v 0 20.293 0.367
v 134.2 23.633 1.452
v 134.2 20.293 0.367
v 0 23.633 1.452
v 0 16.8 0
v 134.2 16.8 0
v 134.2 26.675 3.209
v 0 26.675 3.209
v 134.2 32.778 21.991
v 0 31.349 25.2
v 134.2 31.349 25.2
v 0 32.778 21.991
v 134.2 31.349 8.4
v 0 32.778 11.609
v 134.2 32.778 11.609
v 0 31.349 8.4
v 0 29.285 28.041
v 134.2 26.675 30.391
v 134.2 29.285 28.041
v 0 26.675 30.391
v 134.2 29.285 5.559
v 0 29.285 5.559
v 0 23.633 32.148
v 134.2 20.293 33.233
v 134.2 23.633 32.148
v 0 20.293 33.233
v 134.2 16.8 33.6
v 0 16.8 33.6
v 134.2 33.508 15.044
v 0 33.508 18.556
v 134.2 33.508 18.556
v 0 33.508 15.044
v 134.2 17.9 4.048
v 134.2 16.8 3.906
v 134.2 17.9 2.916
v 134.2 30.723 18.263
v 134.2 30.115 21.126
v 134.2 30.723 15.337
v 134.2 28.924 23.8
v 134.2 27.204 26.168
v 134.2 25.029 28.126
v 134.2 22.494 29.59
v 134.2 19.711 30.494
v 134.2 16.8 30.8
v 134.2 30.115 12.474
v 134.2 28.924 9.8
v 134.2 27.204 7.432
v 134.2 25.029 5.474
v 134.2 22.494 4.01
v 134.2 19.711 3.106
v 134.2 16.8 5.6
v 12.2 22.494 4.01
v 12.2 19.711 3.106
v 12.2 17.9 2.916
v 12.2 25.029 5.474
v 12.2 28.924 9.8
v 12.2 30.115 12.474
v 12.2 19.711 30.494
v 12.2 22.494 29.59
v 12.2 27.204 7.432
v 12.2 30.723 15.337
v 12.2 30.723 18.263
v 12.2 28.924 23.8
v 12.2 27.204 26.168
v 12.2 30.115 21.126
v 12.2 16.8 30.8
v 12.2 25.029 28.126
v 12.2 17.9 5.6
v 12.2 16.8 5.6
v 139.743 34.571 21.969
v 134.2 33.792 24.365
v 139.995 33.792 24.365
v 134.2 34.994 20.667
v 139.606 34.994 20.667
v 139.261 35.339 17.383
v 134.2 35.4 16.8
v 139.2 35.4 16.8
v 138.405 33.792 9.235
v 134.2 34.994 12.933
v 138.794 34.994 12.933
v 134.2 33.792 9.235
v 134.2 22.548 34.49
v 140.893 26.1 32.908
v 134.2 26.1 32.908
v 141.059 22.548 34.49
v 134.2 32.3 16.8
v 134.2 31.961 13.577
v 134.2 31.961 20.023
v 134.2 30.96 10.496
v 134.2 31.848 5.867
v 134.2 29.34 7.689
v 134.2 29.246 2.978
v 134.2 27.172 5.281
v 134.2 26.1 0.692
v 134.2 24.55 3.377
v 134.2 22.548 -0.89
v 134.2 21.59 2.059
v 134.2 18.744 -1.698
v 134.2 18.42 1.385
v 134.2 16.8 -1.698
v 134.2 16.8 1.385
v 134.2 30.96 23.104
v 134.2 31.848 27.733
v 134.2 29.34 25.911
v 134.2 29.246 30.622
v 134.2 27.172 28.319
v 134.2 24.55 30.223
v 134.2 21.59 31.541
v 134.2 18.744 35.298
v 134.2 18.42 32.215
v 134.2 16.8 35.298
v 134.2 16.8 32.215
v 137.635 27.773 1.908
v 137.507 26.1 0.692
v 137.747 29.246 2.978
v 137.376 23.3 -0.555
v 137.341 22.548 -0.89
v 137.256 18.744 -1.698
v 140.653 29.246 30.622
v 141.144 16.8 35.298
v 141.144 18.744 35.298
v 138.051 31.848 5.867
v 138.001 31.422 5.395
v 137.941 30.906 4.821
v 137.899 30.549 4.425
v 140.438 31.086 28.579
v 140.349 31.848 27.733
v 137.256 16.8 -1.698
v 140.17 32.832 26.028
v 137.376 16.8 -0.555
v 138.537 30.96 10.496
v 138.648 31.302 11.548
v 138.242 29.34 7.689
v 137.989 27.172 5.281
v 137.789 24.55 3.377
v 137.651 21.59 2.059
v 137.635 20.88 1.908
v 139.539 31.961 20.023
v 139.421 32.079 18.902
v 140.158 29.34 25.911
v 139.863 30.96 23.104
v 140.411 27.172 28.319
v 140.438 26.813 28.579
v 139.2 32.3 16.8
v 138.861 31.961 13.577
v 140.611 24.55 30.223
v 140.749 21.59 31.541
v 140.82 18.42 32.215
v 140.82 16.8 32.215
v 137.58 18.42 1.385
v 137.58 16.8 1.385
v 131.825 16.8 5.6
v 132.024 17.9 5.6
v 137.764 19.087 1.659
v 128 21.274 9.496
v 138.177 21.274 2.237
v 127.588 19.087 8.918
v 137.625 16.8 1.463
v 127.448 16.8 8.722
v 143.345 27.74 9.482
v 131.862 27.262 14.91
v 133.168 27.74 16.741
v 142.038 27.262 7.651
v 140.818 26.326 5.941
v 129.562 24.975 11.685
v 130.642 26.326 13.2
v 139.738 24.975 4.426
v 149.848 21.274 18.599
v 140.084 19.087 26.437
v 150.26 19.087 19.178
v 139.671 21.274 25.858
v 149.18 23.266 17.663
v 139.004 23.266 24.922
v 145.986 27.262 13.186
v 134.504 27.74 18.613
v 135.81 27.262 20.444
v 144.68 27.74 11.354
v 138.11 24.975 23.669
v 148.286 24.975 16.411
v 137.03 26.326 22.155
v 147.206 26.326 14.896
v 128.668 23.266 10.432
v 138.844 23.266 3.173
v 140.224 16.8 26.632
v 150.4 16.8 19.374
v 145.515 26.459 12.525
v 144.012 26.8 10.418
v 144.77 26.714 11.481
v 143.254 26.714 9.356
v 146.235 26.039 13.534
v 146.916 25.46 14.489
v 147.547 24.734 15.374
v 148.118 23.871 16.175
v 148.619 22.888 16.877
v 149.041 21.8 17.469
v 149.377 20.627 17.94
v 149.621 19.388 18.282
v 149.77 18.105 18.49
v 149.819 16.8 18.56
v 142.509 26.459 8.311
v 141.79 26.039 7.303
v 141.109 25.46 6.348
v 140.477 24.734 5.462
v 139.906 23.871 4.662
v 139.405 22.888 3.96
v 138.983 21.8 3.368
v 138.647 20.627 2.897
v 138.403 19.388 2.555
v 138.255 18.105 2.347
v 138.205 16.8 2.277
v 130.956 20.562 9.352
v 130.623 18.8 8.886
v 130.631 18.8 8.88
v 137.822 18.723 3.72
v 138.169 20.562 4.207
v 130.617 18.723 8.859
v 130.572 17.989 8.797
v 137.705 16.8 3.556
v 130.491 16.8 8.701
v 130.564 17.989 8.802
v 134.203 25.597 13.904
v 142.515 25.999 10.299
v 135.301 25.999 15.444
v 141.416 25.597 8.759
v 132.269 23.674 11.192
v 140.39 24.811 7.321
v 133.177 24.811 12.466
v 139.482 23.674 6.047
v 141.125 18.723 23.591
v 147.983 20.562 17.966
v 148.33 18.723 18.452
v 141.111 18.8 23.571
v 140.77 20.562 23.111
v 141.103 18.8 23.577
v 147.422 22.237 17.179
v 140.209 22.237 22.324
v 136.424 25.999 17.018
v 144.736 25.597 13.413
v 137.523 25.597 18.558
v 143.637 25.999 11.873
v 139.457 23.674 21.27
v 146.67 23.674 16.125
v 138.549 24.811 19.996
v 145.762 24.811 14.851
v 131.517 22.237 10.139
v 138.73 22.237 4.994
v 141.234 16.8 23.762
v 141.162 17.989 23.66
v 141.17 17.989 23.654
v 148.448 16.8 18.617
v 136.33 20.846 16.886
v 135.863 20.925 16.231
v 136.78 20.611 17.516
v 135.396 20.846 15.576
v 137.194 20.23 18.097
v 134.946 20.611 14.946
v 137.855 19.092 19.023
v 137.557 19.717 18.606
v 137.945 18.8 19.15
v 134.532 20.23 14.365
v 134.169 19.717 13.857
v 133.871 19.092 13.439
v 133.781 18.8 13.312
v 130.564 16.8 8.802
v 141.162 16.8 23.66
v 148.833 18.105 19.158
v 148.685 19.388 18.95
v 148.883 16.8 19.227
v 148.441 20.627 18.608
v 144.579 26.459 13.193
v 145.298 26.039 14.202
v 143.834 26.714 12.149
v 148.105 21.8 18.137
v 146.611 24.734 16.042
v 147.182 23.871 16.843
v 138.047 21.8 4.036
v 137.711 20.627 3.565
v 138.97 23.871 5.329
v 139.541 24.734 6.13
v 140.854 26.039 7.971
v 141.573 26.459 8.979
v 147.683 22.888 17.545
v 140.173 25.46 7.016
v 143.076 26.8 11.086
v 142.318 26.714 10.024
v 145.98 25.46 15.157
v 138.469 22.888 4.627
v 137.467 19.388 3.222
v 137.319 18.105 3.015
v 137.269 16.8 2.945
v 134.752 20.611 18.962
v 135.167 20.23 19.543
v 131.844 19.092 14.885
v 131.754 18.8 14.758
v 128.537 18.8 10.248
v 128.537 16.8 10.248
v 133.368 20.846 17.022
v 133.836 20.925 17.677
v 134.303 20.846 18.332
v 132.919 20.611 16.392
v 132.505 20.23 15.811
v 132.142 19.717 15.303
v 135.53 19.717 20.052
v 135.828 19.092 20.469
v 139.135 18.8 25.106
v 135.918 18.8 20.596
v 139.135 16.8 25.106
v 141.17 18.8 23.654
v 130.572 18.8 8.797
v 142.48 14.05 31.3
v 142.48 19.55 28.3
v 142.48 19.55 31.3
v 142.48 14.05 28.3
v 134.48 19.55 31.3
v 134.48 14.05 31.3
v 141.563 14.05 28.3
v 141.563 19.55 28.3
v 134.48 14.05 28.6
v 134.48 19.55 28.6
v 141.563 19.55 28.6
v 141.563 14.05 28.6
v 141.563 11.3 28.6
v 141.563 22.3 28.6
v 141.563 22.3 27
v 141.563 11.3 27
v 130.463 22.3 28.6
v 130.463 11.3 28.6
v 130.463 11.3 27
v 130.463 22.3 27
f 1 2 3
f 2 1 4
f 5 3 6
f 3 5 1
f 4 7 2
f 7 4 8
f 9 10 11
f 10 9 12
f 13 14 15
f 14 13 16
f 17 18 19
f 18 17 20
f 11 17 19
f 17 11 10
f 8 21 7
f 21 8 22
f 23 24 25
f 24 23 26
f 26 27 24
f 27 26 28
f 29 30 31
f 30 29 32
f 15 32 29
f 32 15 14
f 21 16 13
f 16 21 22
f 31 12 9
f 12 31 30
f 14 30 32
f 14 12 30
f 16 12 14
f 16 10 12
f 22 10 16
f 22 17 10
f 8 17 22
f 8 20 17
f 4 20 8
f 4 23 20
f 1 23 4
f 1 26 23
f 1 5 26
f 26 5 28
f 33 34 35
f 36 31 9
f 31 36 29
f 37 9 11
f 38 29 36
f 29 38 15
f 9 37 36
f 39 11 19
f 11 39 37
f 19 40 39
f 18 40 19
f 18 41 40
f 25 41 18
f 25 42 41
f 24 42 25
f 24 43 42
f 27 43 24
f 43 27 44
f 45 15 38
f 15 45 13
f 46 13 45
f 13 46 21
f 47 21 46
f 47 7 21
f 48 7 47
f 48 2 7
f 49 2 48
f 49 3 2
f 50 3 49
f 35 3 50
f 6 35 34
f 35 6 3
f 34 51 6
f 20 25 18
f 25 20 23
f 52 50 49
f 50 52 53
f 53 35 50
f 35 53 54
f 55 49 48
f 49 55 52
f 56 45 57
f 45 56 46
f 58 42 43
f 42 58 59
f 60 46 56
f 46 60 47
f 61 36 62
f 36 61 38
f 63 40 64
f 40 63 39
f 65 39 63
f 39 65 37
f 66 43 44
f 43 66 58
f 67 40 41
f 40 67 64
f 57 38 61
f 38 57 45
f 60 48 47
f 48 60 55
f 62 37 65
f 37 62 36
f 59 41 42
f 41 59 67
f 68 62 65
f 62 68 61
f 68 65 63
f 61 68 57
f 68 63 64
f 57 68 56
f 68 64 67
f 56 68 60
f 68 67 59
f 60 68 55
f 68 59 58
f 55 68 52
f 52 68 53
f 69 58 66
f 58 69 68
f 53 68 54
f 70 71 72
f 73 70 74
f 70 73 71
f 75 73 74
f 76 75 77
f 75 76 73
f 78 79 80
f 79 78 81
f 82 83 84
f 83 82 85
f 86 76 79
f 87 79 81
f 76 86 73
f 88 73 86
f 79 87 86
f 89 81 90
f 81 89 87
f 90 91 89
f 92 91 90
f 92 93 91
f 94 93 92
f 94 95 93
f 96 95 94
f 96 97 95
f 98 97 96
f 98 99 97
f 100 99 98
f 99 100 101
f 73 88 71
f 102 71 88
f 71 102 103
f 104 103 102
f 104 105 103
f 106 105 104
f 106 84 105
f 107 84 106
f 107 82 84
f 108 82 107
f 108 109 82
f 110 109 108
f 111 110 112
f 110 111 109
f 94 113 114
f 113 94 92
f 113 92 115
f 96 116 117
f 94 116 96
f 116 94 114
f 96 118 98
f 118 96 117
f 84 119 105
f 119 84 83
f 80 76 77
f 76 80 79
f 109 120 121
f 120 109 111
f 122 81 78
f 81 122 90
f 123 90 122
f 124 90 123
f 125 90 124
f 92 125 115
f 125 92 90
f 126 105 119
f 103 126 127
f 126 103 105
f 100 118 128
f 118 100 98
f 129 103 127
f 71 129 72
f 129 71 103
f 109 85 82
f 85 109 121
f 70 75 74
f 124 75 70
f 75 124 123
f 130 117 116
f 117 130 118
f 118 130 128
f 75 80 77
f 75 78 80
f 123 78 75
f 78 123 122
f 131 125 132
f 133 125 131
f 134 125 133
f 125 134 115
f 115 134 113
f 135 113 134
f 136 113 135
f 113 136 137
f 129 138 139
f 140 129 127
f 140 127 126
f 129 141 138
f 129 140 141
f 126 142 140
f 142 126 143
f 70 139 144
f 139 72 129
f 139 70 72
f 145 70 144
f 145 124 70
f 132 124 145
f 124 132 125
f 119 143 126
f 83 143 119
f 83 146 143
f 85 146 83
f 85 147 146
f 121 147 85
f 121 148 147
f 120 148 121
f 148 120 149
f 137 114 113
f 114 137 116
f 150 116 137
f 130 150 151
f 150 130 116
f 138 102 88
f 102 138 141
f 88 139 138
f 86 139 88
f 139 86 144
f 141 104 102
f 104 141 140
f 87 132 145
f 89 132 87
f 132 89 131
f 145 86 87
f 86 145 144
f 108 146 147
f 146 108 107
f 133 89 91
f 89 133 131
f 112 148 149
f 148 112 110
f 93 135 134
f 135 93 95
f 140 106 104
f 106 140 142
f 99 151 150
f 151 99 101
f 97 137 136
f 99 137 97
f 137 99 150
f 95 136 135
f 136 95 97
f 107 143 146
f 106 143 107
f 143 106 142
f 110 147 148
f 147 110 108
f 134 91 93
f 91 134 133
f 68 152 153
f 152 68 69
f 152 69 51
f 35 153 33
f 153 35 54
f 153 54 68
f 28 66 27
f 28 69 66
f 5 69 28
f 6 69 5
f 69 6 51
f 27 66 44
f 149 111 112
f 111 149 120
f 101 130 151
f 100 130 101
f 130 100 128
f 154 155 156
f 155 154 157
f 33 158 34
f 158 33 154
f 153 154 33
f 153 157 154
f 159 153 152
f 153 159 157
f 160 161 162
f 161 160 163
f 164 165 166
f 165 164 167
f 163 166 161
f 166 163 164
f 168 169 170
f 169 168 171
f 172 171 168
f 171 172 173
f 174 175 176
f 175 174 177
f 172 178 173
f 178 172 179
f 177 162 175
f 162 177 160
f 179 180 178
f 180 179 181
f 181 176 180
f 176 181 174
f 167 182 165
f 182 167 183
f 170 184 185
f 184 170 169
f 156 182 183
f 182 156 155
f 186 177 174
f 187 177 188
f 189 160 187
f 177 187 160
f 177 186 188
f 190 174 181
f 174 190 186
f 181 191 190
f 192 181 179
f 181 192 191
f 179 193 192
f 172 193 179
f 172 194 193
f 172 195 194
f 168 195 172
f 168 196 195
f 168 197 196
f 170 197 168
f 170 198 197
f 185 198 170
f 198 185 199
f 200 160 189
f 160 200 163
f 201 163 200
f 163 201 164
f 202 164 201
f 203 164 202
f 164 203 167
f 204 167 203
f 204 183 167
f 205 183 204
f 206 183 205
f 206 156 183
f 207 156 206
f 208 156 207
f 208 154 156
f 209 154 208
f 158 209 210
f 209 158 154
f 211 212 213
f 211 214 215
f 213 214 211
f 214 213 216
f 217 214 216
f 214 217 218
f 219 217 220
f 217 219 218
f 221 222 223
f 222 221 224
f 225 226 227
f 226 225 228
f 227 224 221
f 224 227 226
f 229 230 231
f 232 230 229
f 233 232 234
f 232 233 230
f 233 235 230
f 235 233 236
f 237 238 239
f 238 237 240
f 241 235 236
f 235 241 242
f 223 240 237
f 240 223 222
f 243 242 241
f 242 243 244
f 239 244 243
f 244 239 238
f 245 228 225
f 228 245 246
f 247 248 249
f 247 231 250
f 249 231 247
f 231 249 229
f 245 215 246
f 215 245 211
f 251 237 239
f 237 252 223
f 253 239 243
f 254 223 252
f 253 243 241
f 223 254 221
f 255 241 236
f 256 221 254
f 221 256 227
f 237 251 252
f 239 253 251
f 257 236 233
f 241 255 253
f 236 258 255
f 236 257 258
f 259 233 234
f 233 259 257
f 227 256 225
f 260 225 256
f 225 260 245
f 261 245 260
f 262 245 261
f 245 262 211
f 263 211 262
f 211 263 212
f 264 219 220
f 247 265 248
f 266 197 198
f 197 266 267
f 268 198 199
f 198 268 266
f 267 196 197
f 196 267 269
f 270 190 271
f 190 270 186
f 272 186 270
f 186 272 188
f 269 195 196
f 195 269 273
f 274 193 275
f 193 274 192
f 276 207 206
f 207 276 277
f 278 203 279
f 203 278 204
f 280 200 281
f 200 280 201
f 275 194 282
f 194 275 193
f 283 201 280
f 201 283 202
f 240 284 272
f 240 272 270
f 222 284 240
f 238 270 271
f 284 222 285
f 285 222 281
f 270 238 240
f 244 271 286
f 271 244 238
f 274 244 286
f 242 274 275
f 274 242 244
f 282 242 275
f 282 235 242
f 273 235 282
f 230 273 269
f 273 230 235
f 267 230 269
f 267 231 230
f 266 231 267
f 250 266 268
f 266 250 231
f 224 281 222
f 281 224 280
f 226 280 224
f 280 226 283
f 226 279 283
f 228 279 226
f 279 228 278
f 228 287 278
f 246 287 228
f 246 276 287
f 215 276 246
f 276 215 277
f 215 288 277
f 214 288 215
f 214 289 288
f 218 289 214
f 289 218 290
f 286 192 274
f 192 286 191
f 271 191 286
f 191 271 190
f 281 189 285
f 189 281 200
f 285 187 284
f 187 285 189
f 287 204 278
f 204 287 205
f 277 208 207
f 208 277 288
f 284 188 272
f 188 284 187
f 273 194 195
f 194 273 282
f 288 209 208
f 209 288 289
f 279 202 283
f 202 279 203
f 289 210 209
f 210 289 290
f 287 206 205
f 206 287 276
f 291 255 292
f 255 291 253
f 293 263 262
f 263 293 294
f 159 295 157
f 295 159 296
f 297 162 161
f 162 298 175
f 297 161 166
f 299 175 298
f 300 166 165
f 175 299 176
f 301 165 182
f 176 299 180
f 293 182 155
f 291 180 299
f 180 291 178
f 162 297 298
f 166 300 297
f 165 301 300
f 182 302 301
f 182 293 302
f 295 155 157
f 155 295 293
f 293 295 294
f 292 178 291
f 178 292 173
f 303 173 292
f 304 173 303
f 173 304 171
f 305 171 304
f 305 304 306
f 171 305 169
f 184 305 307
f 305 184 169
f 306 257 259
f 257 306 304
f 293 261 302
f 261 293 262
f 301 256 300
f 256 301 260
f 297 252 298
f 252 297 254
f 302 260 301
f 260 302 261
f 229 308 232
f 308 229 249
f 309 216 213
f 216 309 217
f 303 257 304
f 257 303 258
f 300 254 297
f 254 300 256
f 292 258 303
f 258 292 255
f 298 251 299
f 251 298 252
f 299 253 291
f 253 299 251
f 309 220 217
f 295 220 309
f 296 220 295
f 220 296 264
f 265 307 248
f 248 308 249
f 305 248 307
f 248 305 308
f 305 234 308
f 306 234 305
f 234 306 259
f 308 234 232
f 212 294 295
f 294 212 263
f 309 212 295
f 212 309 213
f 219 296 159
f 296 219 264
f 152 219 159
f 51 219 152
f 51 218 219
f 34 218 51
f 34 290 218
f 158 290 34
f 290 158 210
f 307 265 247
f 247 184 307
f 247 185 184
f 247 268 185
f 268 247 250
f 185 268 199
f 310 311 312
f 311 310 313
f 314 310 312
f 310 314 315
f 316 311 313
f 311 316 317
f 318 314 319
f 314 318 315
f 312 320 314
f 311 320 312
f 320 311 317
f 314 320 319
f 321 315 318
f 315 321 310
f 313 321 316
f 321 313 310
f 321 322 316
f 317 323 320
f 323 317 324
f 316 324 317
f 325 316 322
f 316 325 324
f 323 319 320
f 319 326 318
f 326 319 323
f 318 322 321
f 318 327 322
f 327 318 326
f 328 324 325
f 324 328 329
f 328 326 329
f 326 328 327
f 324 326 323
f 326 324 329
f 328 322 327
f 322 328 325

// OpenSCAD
// file: 20mm_star_lens_carrier.scad
/*
  For 20mm * 11mm PMMA TIR lenses like: https://www.amazon.com/gp/product/B07VZL6N2Z/

  Replaces/replicates the white plastic plastic housing that comes with the lenses.

  For starboard COB leds like: https://www.amazon.com/gp/product/B07DHB61BH/

  Assumes the main LED body will be ~8mm * 2.5mm (excluding "bubble")
*/
include <common.scad>;
include <20mm_star_lens.scad>;

led_lead_l = 7;

/* Scale the rendered output by this multiple to account for filament shrinkage,
such as if you are using ABS that tends to shrink from 8%-10%. */
shrink_factor = 1.02;

// other

inner_channel_d = lens_ridge_d - 1.5;

// housing_addt = 1;
housing_addt = 0;
// housing_l = lens_total_l+board_t+led_h + housing_addt;
housing_l = lens_cone_l+lens_ridge_l+board_t+led_h + housing_addt;
housing_d = lens_ridge_d + 2;

module housing_cutouts_mock() {
  // pcb cutout
    translate([0, 0, 0]) cylinder(d=board_d, h=board_t);
    // ridge cutout
    translate([0, 0, board_t+led_h+lens_cone_l]) cylinder(d=lens_ridge_d, h=lens_ridge_l);
    // led cutout
    translate([0, 0, board_t]) led();
}

module housing_cutouts_real(ghost_pcb=true) {
  translate([0, 0, 0])
      lens_and_led(include_castelations=false, ghost_pcb=ghost_pcb);
}

module housing(ghost_pcb=true) {
  difference() {
    union() {
      difference() {
        cylinder(d=housing_d, h=housing_l);

        // centre channel
        translate([0, 0, -ff]) cylinder(d=inner_channel_d, h=housing_l+(ff*2));
      }

      translate([0, 0, board_t]) {
        cylinder(d=inner_channel_d, h=led_h-ff);
      }
    }

    translate([0, 0, housing_addt])
      // housing_cutouts_mock();
      housing_cutouts_real(ghost_pcb);
  }
}

module housing_cross_section(ghost_pcb=true) {
  intersection() {
    translate([-housing_d/2, 0, 0]) cube([housing_d, housing_d/2, housing_l+(ff*2)]);
    translate([0, 0, -board_t])
      housing(ghost_pcb);
  }
}

module housing_no_lower() {
  intersection() {
    translate([-housing_d/2, -housing_d/2, 0]) cube([housing_d, housing_d, housing_l+(ff*2)]);
    translate([0, 0, -board_t])
      housing();
  }
}

// lens();
// led();
// star_board();
// translate([0, 0, housing_addt])
//   %lens_and_led();

// scale([shrink_factor, shrink_factor, shrink_factor]) {
//   // housing();
//   // housing_cross_section();
//   housing_no_lower();
// }
// file: 20mm_star_lens.scad
/*
  For 20mm * 11mm PMMA TIR lenses like: https://www.amazon.com/gp/product/B07VZL6N2Z/

  Replaces/replicates the white plastic plastic housing that comes with the lenses.

  For starboard COB leds like: https://www.amazon.com/gp/product/B07DHB61BH/

  Assumes the main LED body will be ~8mm * 2.5mm (excluding "bubble")
*/
include <common.scad>;

// Lens
lens_ridge_d = 20;
lens_ridge_l = 1.15;

lens_front_d = 17.6;
lens_front_l = 1;

lens_cone_l = 11 - (lens_ridge_l + lens_front_l);

lens_aperture_d = 6;

lens_total_l = lens_cone_l + lens_ridge_l + lens_front_l;

// LED Star Board
board_d = 20;
board_t = 1.22;
castelations = 6;
castelation_r = 2.5;

led_d = 8.25;
led_h = 2.5; // just body, not bubble
led_lead_w = 4;
led_lead_l = 3;
led_bubble_d = 5.5;


module lens() {
  cylinder(d=lens_front_d, h=lens_front_l);
  translate([0, 0, lens_front_l]) {
    cylinder(d=lens_ridge_d, h=lens_ridge_l, $fn=48);
      translate([0, 0, lens_ridge_l]) {
        cylinder(d2=lens_aperture_d, d1=lens_front_d, h=lens_cone_l);
      }
  }
}

module star_board(include_castelations=true, ghost_pcb=false) {
  difference() {
    if (ghost_pcb) {
      %cylinder(d=board_d, h=board_t, $fn=48);
    } else {
      cylinder(d=board_d, h=board_t, $fn=48);
    }

    if (include_castelations) {
      for(deg=[0:(360/castelations):360]) {
        rotate([0, 0, deg]) translate([board_d/2, 0, -ff]) cylinder(r=castelation_r, h=board_t+(ff*2));
      }
    }
  }
  translate([0, 0, board_t]) led();
}

module led() {
  cylinder(d=led_d, h=led_h, $fn=32);
  translate([-((led_lead_l*2)+led_d)/2, -led_lead_w/2, 0]) cube([(led_lead_l*2)+led_d, led_lead_w, led_h]);
  translate([0, 0, led_h]) sphere(d=led_bubble_d, $fn=16);
}

module lens_and_led(include_castelations=true, include_cone=false, ghost_pcb=false) {
  translate([0, 0, lens_total_l+board_t+led_h]) rotate([0, 180, 0]) lens();
  star_board(include_castelations, ghost_pcb);

  if (include_cone) {
    // r / h = degrees
    cone_h = led_h*10;
    cone_base_r = cone_h / tan(60); // make cone with 60 degree angle
    %translate([0, 0, board_t+led_h]) cylinder(d1=led_bubble_d, d2=cone_base_r*2, h=cone_h);
  }
}

// lens_and_led(include_cone=true);
// file: common.scad
cavity_d = 27.75; // abs
cavity_l = 85; // length to castelations at bottom. Length including those is more like 122mm

outer_ridge_d = 31;
outer_ridge_min_t = 4.5;
outer_ridge_max_t = 8.5;

locating_pin_h = 3.5;
locating_pin_w = 2.6; // abs

outer_d = cavity_d * 1.2;
outer_l = cavity_l * 1.1;

ff = 0.01;
// main file
include <common.scad>;
include <20mm_star_lens.scad>;
include <20mm_star_lens_carrier.scad>;
led_lead_l = 5;

cavity_d = 28;
cavity_l = 122;

outer_ridge_d = 31;
outer_ridge_min_t = 3;
outer_ridge_max_t = 7;

locating_pin_h = 3;
locating_pin_w = 2.2;

outer_d = cavity_d * 1.2;
outer_l = cavity_l * 1.1;

microusb_body_t = 2.4;
microusb_connector_t = 3; // "flare" at opening of connector
microusb_body_w = 7.4;
microusb_connector_w = 8.0; // ditto flare
microusb_l = 5.5;

module handle() {
  translate([0, outer_d/2, outer_d/2]) rotate([0, 90, 0]) {
    difference() {
      cylinder(d=outer_d, h=outer_l);
      translate([0, 0, outer_l - cavity_l]) cylinder(d=cavity_d, h=cavity_l+ff);
    }

    // locating pin
    translate([(cavity_d/2)-((outer_d-cavity_d)/2), -locating_pin_w/2, 0]) cube([locating_pin_h, locating_pin_w, outer_l]);

    // outer ridge
    translate([0, 0, outer_l]) rotate([0, 0, 90]) difference() {
      cylinder(d=outer_ridge_d*1.2, h=outer_ridge_max_t);
      translate([0, 0, 5]) rotate([6, 0, 0]) cylinder(d=outer_ridge_d*1.3, h=outer_ridge_max_t);
      translate([0, 0, -ff]) cylinder(d=outer_ridge_d, h=outer_ridge_max_t+(ff*2));
    }
  }
}

module handle_cross_section() {
  difference() {
    handle();
    translate([-ff, -outer_d/2, -outer_d/4]) cube([outer_l+outer_ridge_max_t+(ff*2), outer_d, outer_d*2]);
  }


}

module microusb() {
  cube([microusb_connector_w, microusb_l, microusb_connector_t], center=true);
}

module microusb_board() {
  microusb();
  translate([-microusb_body_w/3,0,-microusb_connector_t/1.5]) cube([microusb_body_w*1.5, microusb_l*2, 1.6], center=true);
}

// // simulate handle height while walking
// translate([0, 0, 30*25.4])
// // simulate handle angle while walking
// rotate([0, -8, 0])
  /*
    * 60 degree lens
      * 8 deg handle angle
        * 30 inches high
          * 20 degree lens angle,
            * beam hits the ground at about 40 inches (3.3ft) from user.
          * 25 degree lens angle,
            * beam hits the ground at about 35 inches (2.9ft) from user.
          * 35 degree lens angle,
            * beam hits ground at about 25.5 inches (2.1ft) from user, midpoint at 5.5 feet.

  */
union() {
  handle_cross_section();

  lens_angle = 35.5;

  housing_y_offset = (outer_d - housing_d)/2;

  translate([outer_l-housing_l, 0, 4])
  translate([3.6, 0, 0]) rotate([0,lens_angle,0])
  translate([0, outer_d/2, outer_d/2]) rotate([0, 90, 0]) {
    scale([1,1,1]) {
      housing_cross_section();

      // r / h = degrees
      cone_h = led_h*10;
      cone_base_r = cone_h / tan(60); // make cone with 60 degree angle
      %translate([0, 0, 0]) cylinder(d1=0, d2=cone_base_r*2, h=cone_h);
      %color("blue") cylinder(d=1, h=cone_h);
    }
  }

  translate([outer_l-housing_l, 0, 0])
  translate([18, 0, 13])
  translate([0, outer_d/2, outer_d/2])
  rotate([0, 0, 0])
  microusb_board();
}


// %translate([0, (outer_ridge_d/2)+2, 0]) cube([1,1,outer_ridge_max_t]);
// %translate([0, -(outer_ridge_d/2)-3, 0]) cube([1,1,outer_ridge_min_t]);
// outer_ridge_d = 31;
// outer_ridge_min_t = 3;
// outer_ridge_max_t = 7;
